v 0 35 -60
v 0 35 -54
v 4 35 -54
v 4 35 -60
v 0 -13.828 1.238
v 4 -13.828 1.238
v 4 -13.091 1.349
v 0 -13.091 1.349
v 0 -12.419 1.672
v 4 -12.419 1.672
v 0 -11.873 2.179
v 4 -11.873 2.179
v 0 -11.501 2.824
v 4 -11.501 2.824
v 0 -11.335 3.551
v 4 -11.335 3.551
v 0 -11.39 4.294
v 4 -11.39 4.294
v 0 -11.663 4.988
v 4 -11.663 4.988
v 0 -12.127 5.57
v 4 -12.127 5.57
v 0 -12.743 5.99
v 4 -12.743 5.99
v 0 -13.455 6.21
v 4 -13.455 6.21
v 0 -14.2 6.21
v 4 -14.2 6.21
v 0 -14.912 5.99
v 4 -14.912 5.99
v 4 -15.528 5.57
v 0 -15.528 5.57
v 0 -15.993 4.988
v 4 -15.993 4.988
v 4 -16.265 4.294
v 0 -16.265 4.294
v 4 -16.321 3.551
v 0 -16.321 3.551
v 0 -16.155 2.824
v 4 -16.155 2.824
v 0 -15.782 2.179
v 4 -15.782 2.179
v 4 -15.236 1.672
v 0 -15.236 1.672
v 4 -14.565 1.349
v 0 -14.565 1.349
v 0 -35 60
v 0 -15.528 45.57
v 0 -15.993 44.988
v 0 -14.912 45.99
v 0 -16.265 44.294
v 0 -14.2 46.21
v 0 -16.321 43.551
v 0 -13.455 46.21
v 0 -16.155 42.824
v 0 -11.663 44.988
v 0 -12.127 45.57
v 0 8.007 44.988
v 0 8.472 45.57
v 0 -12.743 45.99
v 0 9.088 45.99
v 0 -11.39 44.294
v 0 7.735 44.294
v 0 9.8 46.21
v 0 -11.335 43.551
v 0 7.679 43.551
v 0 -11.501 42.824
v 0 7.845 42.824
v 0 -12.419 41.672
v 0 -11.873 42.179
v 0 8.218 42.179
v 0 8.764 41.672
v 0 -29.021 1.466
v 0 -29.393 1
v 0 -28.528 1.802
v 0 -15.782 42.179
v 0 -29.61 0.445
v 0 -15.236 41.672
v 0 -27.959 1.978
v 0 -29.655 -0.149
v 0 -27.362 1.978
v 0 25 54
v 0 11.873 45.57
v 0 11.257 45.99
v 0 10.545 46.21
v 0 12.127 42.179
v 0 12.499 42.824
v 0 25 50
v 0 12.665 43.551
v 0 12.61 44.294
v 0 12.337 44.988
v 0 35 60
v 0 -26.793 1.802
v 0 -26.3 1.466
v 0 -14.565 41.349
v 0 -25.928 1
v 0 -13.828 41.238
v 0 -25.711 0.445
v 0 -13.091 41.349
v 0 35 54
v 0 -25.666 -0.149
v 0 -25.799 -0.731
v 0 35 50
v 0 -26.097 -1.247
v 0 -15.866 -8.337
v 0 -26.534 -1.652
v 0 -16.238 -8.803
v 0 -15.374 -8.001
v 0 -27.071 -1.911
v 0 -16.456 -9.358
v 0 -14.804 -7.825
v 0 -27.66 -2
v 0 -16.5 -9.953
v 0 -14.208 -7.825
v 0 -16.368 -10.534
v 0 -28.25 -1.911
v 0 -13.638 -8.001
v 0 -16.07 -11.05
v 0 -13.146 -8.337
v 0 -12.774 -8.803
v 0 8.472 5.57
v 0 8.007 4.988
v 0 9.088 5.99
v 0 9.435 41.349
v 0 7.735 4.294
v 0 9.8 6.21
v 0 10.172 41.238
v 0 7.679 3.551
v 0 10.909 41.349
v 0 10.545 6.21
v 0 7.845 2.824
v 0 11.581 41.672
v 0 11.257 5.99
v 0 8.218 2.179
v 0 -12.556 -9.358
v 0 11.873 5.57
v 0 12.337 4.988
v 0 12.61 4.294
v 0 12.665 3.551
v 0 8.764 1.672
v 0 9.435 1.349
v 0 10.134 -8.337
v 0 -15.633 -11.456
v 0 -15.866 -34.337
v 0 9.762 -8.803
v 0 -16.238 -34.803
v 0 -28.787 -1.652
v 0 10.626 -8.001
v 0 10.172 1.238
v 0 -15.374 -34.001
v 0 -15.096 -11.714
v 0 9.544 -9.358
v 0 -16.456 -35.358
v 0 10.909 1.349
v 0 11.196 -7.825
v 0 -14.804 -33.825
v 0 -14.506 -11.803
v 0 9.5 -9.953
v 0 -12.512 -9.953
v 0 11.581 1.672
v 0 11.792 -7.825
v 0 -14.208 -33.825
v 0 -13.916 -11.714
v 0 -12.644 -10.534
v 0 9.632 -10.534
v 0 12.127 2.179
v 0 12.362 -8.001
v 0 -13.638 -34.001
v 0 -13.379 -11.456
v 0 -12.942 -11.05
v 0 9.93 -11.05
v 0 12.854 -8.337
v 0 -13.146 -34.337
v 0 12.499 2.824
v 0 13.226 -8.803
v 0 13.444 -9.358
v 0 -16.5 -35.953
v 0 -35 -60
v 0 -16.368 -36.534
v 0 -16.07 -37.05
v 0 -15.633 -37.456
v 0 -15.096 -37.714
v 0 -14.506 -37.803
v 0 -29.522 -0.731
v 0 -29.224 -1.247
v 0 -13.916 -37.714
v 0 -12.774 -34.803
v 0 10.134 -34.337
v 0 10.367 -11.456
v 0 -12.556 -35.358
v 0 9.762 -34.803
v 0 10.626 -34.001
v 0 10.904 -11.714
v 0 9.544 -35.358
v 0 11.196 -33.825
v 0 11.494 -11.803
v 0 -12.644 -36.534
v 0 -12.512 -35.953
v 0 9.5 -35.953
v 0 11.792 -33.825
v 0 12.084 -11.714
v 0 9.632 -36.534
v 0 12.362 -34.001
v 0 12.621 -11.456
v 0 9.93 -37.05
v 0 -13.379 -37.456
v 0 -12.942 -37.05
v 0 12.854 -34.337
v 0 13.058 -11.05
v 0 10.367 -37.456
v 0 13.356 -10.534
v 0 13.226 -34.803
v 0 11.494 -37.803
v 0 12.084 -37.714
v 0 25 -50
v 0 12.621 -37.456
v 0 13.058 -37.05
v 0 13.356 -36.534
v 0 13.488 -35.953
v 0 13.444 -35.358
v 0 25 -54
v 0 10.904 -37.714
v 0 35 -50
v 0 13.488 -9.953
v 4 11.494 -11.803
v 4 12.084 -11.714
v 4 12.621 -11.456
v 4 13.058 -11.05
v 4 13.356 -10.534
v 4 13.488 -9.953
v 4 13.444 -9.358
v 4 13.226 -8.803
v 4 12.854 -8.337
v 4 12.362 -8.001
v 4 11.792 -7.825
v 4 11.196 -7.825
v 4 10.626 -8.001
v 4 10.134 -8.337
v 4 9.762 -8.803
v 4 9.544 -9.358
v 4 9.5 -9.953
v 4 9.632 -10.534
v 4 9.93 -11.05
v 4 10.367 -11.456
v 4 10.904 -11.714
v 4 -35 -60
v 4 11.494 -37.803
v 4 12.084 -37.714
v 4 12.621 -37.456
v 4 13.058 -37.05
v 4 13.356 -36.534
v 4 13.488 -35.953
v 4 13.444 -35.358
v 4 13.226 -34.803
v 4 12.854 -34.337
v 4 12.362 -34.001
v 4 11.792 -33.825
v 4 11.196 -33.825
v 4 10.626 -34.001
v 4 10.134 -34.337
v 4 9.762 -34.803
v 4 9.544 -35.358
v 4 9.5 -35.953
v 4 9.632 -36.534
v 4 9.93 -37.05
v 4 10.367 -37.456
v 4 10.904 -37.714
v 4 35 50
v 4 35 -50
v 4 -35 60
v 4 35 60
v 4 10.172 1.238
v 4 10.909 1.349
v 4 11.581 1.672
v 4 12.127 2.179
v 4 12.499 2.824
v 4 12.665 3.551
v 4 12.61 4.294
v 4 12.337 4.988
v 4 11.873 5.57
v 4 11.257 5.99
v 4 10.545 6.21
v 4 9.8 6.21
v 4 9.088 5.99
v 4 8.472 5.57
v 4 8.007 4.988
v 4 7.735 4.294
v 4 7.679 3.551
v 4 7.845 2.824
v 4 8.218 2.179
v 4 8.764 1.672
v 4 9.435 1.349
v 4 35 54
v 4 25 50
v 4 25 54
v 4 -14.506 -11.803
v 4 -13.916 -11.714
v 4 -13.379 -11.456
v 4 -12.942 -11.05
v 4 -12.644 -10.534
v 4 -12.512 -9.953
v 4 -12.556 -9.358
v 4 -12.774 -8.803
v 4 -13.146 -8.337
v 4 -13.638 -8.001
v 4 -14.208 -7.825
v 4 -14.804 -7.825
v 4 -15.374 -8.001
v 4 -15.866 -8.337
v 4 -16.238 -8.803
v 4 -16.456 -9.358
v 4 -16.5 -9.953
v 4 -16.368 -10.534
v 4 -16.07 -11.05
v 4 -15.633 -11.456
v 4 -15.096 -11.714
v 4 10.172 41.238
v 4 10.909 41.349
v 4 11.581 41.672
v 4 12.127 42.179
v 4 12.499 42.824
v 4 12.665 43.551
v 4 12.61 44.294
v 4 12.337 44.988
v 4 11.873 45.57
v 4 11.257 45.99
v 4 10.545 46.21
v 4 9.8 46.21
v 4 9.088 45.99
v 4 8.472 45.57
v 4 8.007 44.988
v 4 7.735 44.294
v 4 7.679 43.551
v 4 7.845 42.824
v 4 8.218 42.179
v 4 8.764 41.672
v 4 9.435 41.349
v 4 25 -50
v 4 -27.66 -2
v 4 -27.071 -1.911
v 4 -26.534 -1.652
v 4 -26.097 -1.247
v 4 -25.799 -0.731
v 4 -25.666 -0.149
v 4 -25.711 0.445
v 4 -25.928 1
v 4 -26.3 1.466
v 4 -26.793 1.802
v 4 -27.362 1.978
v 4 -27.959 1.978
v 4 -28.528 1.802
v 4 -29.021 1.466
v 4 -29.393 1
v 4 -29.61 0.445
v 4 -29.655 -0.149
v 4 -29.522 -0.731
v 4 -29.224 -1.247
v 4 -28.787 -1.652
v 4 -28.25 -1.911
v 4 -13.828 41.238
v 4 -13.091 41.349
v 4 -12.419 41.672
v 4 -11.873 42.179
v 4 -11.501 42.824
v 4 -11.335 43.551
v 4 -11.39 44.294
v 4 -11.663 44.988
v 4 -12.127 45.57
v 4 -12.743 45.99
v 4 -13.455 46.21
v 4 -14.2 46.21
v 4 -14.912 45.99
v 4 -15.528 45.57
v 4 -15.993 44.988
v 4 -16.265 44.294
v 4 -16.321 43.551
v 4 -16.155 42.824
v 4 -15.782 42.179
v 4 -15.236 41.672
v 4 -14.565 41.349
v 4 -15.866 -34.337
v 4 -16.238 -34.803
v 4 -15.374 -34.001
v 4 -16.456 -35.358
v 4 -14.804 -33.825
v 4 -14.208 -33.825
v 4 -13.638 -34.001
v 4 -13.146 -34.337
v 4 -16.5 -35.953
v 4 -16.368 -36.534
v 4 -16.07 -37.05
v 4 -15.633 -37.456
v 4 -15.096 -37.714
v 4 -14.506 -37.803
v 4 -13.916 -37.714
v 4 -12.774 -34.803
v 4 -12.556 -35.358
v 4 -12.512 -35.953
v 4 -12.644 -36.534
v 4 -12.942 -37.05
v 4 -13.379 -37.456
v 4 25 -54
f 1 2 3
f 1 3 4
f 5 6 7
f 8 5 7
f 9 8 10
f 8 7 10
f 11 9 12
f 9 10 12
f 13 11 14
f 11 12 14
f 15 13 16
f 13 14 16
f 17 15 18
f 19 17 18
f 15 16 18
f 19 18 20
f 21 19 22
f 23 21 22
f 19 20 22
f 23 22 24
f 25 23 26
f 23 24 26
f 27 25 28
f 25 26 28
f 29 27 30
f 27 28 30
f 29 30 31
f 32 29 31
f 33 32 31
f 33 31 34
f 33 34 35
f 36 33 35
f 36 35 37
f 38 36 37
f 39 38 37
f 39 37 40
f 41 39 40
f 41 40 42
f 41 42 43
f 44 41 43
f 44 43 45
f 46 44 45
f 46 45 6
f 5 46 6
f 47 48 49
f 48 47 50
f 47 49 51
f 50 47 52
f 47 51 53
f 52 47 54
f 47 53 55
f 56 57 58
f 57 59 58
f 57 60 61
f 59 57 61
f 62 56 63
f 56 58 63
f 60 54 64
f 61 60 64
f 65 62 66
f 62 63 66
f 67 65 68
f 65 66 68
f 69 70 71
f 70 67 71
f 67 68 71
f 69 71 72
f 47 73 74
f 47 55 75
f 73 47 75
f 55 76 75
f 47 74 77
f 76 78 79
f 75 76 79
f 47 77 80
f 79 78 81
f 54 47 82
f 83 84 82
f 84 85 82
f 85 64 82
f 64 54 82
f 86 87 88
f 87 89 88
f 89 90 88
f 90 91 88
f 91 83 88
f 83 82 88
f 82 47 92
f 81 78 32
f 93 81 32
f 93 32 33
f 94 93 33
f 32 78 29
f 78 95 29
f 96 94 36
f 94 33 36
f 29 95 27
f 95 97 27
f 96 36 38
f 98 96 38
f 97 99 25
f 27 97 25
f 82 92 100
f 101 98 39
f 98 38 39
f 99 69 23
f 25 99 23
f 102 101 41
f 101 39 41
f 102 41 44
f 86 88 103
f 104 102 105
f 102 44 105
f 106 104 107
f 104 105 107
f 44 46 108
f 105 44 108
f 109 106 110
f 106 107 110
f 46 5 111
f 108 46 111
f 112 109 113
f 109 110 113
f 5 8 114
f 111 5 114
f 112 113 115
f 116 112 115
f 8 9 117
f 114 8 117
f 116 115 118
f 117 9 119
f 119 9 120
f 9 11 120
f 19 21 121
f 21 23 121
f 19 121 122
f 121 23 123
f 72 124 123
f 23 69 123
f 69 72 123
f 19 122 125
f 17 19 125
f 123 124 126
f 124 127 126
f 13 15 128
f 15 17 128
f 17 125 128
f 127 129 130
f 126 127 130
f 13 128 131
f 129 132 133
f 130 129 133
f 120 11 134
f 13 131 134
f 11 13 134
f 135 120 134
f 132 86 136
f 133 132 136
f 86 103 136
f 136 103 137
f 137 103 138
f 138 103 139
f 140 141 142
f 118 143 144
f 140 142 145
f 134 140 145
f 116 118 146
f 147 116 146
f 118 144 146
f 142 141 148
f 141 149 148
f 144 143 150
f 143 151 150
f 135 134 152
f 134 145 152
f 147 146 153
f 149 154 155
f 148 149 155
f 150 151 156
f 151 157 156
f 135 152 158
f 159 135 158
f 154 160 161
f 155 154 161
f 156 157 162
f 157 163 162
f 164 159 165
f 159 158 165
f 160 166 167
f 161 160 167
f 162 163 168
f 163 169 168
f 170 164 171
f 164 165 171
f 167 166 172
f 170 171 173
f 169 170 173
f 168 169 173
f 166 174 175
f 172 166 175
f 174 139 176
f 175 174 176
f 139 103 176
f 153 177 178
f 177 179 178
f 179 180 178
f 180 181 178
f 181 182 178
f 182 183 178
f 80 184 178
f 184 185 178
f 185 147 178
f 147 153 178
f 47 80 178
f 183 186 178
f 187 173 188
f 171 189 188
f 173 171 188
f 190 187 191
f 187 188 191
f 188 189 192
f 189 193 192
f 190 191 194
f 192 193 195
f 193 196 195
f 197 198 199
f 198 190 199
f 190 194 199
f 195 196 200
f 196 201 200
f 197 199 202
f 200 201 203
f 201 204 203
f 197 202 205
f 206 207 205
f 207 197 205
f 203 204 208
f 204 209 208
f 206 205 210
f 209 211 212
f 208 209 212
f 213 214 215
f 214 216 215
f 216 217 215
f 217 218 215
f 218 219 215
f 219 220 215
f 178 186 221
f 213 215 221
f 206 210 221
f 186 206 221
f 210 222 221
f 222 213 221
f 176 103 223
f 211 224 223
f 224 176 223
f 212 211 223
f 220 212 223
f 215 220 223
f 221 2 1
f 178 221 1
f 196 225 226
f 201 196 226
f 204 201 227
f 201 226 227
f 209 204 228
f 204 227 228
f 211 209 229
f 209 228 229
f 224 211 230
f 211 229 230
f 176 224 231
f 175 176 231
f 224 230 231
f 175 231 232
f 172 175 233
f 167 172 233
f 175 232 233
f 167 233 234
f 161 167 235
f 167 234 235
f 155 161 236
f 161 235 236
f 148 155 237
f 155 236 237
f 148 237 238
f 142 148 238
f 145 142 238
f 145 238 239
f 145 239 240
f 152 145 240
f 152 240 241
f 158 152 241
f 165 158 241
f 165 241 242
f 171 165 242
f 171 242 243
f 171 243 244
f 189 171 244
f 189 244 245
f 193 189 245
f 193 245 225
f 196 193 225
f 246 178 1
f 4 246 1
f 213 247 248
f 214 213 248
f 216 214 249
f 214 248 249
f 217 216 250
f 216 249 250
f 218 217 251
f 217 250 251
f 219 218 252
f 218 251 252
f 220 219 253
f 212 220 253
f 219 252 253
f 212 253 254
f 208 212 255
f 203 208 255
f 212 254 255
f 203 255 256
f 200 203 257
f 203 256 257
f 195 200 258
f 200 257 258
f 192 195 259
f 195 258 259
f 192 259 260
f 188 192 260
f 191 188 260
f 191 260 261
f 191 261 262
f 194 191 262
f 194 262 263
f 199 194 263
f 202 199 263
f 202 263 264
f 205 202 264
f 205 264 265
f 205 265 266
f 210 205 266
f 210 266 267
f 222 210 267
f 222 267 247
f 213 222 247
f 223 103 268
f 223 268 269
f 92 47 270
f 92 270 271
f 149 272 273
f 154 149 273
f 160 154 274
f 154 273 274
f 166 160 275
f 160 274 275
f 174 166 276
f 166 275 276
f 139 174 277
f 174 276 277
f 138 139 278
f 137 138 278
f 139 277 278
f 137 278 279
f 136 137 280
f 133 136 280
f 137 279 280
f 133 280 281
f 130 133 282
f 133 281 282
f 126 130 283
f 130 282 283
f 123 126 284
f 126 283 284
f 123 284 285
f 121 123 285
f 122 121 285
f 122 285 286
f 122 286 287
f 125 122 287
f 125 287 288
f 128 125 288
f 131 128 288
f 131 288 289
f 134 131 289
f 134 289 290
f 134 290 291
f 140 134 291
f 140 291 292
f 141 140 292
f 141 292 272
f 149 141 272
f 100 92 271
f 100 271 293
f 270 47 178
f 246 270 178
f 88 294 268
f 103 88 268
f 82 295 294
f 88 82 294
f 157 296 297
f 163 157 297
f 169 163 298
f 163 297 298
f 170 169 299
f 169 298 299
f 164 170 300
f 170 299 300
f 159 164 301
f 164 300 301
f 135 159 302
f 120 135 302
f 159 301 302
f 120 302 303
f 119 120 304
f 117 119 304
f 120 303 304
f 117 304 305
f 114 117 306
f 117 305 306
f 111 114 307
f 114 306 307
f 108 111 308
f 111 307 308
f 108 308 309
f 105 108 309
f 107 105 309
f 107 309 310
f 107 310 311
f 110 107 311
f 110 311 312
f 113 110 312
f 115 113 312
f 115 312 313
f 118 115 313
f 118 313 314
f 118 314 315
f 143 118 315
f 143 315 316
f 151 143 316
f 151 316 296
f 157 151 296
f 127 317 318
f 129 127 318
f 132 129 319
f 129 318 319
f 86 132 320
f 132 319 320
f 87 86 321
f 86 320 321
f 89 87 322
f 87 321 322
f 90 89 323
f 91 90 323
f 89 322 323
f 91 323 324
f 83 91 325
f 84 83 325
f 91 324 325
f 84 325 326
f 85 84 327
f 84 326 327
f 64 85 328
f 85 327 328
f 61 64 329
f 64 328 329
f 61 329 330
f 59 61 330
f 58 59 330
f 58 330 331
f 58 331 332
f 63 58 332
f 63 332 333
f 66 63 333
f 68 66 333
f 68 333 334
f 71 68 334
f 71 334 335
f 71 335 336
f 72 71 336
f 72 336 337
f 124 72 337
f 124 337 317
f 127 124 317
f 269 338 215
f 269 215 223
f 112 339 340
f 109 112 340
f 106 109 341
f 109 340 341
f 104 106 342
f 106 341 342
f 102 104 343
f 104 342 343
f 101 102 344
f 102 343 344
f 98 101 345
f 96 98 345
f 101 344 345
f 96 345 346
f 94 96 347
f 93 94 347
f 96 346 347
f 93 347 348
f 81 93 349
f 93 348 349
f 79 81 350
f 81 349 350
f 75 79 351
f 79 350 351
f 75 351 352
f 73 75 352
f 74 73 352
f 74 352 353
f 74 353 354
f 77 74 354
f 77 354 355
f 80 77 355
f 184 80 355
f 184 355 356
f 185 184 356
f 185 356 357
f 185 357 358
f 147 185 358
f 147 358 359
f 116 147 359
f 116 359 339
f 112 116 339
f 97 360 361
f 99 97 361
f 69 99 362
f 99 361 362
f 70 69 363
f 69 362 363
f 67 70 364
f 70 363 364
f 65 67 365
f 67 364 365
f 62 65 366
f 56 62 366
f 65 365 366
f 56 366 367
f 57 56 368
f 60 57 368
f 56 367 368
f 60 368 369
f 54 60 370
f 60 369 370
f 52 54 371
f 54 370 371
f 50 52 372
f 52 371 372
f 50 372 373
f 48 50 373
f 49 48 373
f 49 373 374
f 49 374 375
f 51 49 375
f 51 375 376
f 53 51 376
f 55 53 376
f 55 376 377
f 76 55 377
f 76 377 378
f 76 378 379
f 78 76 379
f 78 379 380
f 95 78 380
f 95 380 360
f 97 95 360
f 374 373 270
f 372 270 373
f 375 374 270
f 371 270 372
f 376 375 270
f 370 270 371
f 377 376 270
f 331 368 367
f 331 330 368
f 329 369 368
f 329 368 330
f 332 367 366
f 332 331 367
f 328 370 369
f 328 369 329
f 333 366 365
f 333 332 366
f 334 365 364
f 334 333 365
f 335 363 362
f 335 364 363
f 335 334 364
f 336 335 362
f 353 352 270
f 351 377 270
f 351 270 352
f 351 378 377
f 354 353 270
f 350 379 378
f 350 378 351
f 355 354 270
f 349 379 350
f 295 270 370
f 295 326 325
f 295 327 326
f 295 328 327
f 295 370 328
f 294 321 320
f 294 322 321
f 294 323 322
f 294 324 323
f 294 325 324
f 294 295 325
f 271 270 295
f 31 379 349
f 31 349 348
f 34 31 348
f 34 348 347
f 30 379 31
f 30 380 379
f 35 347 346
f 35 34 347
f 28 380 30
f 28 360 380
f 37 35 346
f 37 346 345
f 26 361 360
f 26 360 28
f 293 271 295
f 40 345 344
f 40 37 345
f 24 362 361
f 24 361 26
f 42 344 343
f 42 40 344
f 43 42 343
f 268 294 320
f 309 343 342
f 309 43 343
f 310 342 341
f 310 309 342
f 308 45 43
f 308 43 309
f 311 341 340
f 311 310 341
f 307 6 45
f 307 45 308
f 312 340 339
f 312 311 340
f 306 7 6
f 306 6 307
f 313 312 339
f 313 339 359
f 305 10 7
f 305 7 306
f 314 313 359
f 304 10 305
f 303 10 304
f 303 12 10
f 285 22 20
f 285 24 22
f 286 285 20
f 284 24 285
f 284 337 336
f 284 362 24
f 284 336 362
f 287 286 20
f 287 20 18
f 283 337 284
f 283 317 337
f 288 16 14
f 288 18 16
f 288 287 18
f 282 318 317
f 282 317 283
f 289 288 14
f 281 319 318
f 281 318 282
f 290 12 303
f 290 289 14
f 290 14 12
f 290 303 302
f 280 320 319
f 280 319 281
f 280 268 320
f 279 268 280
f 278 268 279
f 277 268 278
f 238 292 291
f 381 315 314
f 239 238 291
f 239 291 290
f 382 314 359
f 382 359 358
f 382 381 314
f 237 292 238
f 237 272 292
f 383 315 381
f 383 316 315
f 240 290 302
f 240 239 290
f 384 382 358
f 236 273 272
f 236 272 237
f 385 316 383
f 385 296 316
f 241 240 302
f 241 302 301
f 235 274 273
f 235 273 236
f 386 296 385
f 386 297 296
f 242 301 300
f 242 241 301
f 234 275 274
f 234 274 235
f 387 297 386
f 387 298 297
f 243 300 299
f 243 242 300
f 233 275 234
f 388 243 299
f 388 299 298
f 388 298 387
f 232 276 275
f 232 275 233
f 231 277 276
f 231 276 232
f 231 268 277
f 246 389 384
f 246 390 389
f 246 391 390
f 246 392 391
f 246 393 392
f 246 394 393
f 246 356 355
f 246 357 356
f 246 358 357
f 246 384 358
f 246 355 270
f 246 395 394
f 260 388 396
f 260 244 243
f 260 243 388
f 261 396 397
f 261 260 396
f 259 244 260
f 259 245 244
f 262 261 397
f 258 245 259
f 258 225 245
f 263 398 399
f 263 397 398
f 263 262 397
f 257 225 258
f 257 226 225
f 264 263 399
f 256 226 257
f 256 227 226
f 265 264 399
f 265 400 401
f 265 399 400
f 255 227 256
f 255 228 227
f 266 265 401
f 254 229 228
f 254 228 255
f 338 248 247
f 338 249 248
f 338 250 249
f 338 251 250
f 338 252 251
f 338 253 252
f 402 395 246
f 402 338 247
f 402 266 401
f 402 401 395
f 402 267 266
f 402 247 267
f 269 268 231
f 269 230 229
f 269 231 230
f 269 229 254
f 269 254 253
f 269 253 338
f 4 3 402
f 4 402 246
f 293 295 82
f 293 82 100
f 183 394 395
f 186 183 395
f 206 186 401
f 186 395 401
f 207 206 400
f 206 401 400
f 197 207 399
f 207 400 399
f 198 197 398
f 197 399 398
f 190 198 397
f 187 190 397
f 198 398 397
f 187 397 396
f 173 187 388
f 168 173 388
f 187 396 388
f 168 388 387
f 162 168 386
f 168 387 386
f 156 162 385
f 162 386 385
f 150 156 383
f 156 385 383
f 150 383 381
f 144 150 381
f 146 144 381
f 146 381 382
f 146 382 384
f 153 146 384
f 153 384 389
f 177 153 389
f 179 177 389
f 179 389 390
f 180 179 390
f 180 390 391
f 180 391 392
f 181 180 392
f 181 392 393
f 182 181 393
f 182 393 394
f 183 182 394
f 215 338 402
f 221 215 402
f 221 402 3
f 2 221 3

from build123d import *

# Parameters (mm, degrees)
SKETCH_1_W          = 120
SKETCH_1_H          = 70
EXTRUDE_1_DEPTH     = 4
SKETCH_2_R          = 2
SKETCH_2_W          = 4
SKETCH_2_H          = 10
CUT_EXTRUDE_1_DEPTH = 5
SKETCH_3_R          = 2.5
SKETCH_3_R_2        = 2
CUT_EXTRUDE_2_DEPTH = 5


with BuildPart() as part:
    # Эскиз1 → Бобышка-Вытянуть1 (new body)
    with BuildSketch(Plane(origin=(0, 0, 0), x_dir=(0, 0, -1), z_dir=(1, 0, 0))):
        Rectangle(SKETCH_1_W, SKETCH_1_H)
    extrude(amount=EXTRUDE_1_DEPTH)

    # Эскиз2 → Вырез-Вытянуть1 (cut, through all)
    with BuildSketch(Plane(origin=(4, 0, 0), x_dir=(0, 0, -1), z_dir=(1, 0, 0))):
        with Locations((0, -27.660492885)):
            Circle(SKETCH_2_R)
        with Locations((-52, 30)):
            Rectangle(SKETCH_2_W, SKETCH_2_H)
        with Locations((52, 30)):
            Rectangle(SKETCH_2_W, SKETCH_2_H)
    extrude(amount=-CUT_EXTRUDE_1_DEPTH, mode=Mode.SUBTRACT)

    # Эскиз3 → Вырез-Вытянуть2 (cut, through all)
    with BuildSketch(Plane(origin=(4, 0, 0), x_dir=(0, 0, -1), z_dir=(1, 0, 0))):
        with Locations((-43.737507579, 10.172241739)):
            Circle(SKETCH_3_R)
        with Locations((-43.737507579, -13.827758261)):
            Circle(SKETCH_3_R)
        with Locations((-3.737507579, -13.827758261)):
            Circle(SKETCH_3_R)
        with Locations((-3.737507579, 10.172241739)):
            Circle(SKETCH_3_R)
        with Locations((9.8030981, 11.493999532)):
            Circle(SKETCH_3_R_2)
        with Locations((35.8030981, 11.493999532)):
            Circle(SKETCH_3_R_2)
        with Locations((35.8030981, -14.506000468)):
            Circle(SKETCH_3_R_2)
        with Locations((9.8030981, -14.506000468)):
            Circle(SKETCH_3_R_2)
    extrude(amount=-CUT_EXTRUDE_2_DEPTH, mode=Mode.SUBTRACT)


solid = part.part
